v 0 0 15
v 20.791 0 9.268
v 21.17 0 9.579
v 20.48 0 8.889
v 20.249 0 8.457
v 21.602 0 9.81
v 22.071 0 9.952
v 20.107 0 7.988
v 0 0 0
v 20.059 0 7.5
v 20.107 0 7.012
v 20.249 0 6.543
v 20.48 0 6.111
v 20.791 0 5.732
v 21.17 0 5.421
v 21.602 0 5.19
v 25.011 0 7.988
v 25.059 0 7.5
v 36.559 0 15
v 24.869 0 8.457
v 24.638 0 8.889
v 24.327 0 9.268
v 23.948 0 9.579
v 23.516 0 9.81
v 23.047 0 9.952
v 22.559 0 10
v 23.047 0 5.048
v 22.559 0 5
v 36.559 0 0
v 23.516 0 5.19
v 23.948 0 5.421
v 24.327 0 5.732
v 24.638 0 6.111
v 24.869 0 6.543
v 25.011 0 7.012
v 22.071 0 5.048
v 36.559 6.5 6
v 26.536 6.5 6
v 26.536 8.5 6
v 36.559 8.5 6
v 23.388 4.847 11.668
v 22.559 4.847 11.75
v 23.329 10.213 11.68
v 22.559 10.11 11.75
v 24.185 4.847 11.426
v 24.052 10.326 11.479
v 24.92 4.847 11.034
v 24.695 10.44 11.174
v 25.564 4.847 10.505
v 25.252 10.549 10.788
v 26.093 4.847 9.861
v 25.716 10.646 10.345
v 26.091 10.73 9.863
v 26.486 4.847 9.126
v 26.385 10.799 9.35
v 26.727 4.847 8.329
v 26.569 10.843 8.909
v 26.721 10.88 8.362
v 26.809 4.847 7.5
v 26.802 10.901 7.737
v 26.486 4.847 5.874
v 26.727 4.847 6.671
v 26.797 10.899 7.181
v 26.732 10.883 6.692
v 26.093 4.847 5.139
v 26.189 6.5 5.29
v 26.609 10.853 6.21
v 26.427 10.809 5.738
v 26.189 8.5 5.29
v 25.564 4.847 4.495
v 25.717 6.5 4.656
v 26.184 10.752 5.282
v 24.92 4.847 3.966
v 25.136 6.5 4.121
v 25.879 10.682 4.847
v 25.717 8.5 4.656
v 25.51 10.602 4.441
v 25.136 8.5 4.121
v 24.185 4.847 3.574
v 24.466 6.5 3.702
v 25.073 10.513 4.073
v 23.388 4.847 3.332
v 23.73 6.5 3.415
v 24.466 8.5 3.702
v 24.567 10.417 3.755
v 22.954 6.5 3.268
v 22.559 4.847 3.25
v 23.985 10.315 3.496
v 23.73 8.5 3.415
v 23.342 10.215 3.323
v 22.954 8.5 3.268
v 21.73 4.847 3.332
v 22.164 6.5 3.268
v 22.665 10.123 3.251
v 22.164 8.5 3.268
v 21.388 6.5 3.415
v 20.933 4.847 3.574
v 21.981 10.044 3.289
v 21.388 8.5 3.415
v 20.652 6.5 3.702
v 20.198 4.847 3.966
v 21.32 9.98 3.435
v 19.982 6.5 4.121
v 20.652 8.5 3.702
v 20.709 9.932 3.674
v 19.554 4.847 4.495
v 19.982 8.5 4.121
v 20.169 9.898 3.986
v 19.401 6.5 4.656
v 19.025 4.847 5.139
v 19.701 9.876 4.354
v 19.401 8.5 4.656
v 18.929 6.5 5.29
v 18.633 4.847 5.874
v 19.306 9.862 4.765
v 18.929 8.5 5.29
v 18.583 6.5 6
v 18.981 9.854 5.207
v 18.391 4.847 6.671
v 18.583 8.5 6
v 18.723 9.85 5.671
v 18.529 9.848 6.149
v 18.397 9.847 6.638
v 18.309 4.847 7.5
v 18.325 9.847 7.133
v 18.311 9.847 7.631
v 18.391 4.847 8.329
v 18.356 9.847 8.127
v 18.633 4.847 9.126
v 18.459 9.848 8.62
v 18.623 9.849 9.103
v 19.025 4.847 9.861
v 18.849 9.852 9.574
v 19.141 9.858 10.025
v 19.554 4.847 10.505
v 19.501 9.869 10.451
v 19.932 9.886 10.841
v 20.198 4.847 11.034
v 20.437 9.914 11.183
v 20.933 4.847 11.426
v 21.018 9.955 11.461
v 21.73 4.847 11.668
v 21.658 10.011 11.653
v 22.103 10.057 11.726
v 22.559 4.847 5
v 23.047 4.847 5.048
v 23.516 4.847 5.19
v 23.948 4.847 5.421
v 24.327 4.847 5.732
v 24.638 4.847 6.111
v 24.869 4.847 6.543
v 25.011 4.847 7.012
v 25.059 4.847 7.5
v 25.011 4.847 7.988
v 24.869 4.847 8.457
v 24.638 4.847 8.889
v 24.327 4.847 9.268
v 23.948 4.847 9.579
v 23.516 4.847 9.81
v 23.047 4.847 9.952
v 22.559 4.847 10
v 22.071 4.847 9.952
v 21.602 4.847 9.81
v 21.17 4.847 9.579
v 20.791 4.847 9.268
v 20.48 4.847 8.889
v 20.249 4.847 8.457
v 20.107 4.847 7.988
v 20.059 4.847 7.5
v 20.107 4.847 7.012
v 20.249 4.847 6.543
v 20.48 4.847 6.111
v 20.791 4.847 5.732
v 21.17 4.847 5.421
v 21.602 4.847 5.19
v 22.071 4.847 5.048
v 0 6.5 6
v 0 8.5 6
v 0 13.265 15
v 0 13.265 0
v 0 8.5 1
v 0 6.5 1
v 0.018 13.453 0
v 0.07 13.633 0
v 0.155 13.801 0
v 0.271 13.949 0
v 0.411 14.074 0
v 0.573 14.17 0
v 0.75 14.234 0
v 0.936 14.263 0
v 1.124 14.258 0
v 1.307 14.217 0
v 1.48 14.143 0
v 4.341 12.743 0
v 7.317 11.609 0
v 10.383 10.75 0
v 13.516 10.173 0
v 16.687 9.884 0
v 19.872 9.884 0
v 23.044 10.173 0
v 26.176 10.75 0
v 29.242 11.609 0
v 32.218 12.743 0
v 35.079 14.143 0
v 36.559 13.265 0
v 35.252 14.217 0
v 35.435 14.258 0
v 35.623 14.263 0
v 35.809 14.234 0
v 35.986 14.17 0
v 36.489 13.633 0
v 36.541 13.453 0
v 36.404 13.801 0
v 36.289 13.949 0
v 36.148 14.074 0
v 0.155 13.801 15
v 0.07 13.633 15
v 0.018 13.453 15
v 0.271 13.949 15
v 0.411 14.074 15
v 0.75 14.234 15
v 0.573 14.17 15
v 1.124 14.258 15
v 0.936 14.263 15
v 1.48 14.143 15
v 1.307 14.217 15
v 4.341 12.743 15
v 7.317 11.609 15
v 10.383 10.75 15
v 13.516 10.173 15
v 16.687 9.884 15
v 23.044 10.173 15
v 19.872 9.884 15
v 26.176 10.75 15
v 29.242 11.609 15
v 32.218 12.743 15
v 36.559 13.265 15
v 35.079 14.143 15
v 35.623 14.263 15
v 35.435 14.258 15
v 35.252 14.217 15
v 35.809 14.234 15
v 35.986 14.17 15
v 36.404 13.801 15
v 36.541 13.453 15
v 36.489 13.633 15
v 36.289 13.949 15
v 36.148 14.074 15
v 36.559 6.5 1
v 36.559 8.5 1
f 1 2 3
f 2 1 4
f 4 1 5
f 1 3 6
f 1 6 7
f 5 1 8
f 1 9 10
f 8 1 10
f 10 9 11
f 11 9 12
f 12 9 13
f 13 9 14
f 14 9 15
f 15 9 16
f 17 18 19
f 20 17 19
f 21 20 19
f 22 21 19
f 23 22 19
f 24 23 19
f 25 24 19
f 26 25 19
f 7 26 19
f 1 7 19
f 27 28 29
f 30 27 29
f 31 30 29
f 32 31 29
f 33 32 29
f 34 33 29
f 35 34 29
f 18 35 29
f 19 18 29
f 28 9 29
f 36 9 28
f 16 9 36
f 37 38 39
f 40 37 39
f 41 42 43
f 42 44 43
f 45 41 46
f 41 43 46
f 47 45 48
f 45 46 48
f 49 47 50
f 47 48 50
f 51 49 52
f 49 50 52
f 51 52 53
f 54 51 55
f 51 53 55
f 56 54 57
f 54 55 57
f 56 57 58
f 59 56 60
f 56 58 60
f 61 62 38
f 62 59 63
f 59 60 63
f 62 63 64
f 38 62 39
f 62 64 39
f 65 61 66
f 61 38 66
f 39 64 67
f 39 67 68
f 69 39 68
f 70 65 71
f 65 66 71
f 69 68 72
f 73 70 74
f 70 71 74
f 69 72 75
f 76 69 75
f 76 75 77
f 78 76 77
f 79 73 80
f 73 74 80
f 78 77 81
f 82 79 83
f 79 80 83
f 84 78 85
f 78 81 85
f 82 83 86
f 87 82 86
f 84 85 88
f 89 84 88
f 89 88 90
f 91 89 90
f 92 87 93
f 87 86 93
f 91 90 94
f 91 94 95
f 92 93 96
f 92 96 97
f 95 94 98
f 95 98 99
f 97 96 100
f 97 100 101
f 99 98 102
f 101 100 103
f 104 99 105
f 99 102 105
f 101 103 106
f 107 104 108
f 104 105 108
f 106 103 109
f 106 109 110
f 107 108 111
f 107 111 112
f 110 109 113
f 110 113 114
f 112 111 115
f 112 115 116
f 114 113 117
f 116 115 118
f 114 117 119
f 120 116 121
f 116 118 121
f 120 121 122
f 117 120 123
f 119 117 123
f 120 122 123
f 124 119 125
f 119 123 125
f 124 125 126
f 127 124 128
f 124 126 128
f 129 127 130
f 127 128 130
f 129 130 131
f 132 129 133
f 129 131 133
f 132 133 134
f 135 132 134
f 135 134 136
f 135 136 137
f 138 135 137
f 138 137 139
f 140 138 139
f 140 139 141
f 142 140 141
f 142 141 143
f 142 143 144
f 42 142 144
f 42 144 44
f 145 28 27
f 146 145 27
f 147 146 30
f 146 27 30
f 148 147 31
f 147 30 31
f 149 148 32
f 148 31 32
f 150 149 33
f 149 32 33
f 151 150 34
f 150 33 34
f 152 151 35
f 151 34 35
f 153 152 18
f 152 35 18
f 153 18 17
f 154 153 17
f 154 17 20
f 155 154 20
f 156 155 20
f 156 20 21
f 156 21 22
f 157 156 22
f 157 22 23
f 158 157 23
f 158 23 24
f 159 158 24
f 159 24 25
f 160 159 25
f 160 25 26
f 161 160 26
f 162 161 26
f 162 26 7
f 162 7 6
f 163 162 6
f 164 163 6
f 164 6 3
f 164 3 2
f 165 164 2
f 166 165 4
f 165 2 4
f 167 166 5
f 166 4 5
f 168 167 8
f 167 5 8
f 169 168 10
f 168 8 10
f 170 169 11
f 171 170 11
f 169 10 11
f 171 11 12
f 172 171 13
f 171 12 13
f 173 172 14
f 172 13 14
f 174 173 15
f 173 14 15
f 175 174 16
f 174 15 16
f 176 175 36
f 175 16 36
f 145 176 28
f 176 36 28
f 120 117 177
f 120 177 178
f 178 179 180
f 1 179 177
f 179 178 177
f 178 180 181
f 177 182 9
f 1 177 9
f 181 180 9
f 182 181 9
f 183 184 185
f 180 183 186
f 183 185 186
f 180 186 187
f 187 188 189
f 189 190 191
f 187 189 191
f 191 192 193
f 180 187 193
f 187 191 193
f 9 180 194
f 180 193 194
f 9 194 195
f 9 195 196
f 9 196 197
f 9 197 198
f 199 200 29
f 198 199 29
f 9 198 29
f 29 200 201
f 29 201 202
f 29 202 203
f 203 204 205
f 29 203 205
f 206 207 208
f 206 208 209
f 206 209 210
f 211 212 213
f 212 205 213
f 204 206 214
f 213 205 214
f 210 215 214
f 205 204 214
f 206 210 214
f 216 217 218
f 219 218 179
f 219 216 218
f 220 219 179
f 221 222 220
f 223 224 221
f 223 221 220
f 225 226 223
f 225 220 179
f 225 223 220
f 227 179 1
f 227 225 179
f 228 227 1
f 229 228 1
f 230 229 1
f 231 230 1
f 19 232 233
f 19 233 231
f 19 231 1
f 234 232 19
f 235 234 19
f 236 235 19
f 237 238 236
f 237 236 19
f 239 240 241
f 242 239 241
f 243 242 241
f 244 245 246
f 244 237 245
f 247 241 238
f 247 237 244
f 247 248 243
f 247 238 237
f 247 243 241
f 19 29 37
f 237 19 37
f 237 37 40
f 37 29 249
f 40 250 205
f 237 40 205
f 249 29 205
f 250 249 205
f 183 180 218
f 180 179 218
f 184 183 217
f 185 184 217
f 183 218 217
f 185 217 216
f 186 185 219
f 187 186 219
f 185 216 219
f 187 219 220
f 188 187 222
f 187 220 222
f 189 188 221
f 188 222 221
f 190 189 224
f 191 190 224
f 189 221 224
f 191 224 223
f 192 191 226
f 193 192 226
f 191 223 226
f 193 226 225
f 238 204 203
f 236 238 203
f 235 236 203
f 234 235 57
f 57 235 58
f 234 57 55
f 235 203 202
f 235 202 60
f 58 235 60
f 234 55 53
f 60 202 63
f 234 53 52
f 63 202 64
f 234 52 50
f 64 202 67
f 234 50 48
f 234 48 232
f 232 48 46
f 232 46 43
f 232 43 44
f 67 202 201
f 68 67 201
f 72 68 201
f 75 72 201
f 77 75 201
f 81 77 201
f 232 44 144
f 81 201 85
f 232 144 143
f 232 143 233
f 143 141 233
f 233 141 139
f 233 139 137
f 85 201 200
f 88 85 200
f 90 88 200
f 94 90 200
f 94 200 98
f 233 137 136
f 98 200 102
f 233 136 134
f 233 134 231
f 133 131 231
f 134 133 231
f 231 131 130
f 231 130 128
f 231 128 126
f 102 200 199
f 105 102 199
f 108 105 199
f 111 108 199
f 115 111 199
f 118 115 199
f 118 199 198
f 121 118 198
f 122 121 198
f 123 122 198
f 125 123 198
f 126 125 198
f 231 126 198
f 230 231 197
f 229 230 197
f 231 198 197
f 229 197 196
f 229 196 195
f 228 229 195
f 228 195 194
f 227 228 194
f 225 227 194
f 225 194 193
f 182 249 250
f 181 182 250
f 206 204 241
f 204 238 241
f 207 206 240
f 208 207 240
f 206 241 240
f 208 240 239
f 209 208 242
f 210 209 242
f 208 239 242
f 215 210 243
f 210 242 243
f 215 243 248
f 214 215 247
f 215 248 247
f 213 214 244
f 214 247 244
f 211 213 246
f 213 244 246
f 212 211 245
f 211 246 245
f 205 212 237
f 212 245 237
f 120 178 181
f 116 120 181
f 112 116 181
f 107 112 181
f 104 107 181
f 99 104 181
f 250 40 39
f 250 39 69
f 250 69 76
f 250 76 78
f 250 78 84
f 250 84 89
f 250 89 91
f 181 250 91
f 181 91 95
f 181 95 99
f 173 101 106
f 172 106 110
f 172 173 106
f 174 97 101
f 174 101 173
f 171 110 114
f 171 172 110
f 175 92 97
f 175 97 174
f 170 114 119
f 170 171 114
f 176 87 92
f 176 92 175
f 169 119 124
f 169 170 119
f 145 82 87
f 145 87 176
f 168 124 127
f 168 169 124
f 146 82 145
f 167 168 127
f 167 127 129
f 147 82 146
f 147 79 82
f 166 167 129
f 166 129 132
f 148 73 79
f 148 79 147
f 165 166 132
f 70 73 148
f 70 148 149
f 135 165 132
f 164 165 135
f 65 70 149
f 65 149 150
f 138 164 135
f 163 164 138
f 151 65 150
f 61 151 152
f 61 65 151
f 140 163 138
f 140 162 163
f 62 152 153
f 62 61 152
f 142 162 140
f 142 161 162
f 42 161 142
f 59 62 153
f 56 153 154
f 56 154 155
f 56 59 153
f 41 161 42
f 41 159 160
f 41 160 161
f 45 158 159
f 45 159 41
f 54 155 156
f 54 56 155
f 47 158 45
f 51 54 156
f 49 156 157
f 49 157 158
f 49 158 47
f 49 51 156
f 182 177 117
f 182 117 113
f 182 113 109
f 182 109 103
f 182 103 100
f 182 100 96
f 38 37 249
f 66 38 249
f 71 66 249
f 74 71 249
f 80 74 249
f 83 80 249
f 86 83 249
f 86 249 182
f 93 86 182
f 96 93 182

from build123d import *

# Parameters (mm, degrees)
BOSS_EXTRUDE2_DEPTH = 15
SKETCH4_R           = 2.5
CUT_EXTRUDE1_DEPTH  = 15
SKETCH5_R           = 4.25
CUT_EXTRUDE6_DEPTH  = 5
SKETCH6_W           = 5
SKETCH6_H           = 2
CUT_EXTRUDE7_DEPTH  = 43.267768571
FILLET1_R           = 1


with BuildPart() as part:
    # Sketch2 → Boss-Extrude2 (new body)
    with BuildSketch(Plane.XY):
        with BuildLine():
            Line((0, 15), (0, 0))
            Line((0, 0), (36.559051501, 0))
            Line((36.559051501, 0), (36.559051501, 15))
            ThreePointArc((36.559051501, 15), (18.27952575, 9.847260148), (0, 15))
        make_face()
    extrude(amount=BOSS_EXTRUDE2_DEPTH)

    # Sketch4 → Cut-Extrude1 (cut)
    with BuildSketch(Plane.XZ):
        with Locations(Location((22.559051501, 7.5, 0), (0, 0, 270))):
            Circle(SKETCH4_R)
    extrude(amount=-CUT_EXTRUDE1_DEPTH, mode=Mode.SUBTRACT)

    # Sketch5 → Cut-Extrude6 (cut, symmetric)
    with BuildSketch(Plane(origin=(0, 9.847260148, 0), x_dir=(1, 0, 0), z_dir=(0, 1, 0))):
        with Locations(Location((22.559051501, -7.5, 0), (0, 0, 270))):
            Circle(SKETCH5_R)
    extrude(amount=CUT_EXTRUDE6_DEPTH, both=True, mode=Mode.SUBTRACT)

    # Sketch6 → Cut-Extrude7 (cut, through all)
    with BuildSketch(Plane(origin=(36.559051501, 0, 0), x_dir=(0, 0, -1), z_dir=(1, 0, 0))):
        with Locations((-3.5, 7.5)):
            Rectangle(SKETCH6_W, SKETCH6_H)
    extrude(amount=-CUT_EXTRUDE7_DEPTH, mode=Mode.SUBTRACT)

    # Fillet1
    fillet1_edges = [part.edges().sort_by_distance(p)[0] for p in [
        (0, 15, 7.5),
        (36.559051501, 15, 7.5),
    ]]
    fillet(fillet1_edges, radius=FILLET1_R)


solid = part.part
